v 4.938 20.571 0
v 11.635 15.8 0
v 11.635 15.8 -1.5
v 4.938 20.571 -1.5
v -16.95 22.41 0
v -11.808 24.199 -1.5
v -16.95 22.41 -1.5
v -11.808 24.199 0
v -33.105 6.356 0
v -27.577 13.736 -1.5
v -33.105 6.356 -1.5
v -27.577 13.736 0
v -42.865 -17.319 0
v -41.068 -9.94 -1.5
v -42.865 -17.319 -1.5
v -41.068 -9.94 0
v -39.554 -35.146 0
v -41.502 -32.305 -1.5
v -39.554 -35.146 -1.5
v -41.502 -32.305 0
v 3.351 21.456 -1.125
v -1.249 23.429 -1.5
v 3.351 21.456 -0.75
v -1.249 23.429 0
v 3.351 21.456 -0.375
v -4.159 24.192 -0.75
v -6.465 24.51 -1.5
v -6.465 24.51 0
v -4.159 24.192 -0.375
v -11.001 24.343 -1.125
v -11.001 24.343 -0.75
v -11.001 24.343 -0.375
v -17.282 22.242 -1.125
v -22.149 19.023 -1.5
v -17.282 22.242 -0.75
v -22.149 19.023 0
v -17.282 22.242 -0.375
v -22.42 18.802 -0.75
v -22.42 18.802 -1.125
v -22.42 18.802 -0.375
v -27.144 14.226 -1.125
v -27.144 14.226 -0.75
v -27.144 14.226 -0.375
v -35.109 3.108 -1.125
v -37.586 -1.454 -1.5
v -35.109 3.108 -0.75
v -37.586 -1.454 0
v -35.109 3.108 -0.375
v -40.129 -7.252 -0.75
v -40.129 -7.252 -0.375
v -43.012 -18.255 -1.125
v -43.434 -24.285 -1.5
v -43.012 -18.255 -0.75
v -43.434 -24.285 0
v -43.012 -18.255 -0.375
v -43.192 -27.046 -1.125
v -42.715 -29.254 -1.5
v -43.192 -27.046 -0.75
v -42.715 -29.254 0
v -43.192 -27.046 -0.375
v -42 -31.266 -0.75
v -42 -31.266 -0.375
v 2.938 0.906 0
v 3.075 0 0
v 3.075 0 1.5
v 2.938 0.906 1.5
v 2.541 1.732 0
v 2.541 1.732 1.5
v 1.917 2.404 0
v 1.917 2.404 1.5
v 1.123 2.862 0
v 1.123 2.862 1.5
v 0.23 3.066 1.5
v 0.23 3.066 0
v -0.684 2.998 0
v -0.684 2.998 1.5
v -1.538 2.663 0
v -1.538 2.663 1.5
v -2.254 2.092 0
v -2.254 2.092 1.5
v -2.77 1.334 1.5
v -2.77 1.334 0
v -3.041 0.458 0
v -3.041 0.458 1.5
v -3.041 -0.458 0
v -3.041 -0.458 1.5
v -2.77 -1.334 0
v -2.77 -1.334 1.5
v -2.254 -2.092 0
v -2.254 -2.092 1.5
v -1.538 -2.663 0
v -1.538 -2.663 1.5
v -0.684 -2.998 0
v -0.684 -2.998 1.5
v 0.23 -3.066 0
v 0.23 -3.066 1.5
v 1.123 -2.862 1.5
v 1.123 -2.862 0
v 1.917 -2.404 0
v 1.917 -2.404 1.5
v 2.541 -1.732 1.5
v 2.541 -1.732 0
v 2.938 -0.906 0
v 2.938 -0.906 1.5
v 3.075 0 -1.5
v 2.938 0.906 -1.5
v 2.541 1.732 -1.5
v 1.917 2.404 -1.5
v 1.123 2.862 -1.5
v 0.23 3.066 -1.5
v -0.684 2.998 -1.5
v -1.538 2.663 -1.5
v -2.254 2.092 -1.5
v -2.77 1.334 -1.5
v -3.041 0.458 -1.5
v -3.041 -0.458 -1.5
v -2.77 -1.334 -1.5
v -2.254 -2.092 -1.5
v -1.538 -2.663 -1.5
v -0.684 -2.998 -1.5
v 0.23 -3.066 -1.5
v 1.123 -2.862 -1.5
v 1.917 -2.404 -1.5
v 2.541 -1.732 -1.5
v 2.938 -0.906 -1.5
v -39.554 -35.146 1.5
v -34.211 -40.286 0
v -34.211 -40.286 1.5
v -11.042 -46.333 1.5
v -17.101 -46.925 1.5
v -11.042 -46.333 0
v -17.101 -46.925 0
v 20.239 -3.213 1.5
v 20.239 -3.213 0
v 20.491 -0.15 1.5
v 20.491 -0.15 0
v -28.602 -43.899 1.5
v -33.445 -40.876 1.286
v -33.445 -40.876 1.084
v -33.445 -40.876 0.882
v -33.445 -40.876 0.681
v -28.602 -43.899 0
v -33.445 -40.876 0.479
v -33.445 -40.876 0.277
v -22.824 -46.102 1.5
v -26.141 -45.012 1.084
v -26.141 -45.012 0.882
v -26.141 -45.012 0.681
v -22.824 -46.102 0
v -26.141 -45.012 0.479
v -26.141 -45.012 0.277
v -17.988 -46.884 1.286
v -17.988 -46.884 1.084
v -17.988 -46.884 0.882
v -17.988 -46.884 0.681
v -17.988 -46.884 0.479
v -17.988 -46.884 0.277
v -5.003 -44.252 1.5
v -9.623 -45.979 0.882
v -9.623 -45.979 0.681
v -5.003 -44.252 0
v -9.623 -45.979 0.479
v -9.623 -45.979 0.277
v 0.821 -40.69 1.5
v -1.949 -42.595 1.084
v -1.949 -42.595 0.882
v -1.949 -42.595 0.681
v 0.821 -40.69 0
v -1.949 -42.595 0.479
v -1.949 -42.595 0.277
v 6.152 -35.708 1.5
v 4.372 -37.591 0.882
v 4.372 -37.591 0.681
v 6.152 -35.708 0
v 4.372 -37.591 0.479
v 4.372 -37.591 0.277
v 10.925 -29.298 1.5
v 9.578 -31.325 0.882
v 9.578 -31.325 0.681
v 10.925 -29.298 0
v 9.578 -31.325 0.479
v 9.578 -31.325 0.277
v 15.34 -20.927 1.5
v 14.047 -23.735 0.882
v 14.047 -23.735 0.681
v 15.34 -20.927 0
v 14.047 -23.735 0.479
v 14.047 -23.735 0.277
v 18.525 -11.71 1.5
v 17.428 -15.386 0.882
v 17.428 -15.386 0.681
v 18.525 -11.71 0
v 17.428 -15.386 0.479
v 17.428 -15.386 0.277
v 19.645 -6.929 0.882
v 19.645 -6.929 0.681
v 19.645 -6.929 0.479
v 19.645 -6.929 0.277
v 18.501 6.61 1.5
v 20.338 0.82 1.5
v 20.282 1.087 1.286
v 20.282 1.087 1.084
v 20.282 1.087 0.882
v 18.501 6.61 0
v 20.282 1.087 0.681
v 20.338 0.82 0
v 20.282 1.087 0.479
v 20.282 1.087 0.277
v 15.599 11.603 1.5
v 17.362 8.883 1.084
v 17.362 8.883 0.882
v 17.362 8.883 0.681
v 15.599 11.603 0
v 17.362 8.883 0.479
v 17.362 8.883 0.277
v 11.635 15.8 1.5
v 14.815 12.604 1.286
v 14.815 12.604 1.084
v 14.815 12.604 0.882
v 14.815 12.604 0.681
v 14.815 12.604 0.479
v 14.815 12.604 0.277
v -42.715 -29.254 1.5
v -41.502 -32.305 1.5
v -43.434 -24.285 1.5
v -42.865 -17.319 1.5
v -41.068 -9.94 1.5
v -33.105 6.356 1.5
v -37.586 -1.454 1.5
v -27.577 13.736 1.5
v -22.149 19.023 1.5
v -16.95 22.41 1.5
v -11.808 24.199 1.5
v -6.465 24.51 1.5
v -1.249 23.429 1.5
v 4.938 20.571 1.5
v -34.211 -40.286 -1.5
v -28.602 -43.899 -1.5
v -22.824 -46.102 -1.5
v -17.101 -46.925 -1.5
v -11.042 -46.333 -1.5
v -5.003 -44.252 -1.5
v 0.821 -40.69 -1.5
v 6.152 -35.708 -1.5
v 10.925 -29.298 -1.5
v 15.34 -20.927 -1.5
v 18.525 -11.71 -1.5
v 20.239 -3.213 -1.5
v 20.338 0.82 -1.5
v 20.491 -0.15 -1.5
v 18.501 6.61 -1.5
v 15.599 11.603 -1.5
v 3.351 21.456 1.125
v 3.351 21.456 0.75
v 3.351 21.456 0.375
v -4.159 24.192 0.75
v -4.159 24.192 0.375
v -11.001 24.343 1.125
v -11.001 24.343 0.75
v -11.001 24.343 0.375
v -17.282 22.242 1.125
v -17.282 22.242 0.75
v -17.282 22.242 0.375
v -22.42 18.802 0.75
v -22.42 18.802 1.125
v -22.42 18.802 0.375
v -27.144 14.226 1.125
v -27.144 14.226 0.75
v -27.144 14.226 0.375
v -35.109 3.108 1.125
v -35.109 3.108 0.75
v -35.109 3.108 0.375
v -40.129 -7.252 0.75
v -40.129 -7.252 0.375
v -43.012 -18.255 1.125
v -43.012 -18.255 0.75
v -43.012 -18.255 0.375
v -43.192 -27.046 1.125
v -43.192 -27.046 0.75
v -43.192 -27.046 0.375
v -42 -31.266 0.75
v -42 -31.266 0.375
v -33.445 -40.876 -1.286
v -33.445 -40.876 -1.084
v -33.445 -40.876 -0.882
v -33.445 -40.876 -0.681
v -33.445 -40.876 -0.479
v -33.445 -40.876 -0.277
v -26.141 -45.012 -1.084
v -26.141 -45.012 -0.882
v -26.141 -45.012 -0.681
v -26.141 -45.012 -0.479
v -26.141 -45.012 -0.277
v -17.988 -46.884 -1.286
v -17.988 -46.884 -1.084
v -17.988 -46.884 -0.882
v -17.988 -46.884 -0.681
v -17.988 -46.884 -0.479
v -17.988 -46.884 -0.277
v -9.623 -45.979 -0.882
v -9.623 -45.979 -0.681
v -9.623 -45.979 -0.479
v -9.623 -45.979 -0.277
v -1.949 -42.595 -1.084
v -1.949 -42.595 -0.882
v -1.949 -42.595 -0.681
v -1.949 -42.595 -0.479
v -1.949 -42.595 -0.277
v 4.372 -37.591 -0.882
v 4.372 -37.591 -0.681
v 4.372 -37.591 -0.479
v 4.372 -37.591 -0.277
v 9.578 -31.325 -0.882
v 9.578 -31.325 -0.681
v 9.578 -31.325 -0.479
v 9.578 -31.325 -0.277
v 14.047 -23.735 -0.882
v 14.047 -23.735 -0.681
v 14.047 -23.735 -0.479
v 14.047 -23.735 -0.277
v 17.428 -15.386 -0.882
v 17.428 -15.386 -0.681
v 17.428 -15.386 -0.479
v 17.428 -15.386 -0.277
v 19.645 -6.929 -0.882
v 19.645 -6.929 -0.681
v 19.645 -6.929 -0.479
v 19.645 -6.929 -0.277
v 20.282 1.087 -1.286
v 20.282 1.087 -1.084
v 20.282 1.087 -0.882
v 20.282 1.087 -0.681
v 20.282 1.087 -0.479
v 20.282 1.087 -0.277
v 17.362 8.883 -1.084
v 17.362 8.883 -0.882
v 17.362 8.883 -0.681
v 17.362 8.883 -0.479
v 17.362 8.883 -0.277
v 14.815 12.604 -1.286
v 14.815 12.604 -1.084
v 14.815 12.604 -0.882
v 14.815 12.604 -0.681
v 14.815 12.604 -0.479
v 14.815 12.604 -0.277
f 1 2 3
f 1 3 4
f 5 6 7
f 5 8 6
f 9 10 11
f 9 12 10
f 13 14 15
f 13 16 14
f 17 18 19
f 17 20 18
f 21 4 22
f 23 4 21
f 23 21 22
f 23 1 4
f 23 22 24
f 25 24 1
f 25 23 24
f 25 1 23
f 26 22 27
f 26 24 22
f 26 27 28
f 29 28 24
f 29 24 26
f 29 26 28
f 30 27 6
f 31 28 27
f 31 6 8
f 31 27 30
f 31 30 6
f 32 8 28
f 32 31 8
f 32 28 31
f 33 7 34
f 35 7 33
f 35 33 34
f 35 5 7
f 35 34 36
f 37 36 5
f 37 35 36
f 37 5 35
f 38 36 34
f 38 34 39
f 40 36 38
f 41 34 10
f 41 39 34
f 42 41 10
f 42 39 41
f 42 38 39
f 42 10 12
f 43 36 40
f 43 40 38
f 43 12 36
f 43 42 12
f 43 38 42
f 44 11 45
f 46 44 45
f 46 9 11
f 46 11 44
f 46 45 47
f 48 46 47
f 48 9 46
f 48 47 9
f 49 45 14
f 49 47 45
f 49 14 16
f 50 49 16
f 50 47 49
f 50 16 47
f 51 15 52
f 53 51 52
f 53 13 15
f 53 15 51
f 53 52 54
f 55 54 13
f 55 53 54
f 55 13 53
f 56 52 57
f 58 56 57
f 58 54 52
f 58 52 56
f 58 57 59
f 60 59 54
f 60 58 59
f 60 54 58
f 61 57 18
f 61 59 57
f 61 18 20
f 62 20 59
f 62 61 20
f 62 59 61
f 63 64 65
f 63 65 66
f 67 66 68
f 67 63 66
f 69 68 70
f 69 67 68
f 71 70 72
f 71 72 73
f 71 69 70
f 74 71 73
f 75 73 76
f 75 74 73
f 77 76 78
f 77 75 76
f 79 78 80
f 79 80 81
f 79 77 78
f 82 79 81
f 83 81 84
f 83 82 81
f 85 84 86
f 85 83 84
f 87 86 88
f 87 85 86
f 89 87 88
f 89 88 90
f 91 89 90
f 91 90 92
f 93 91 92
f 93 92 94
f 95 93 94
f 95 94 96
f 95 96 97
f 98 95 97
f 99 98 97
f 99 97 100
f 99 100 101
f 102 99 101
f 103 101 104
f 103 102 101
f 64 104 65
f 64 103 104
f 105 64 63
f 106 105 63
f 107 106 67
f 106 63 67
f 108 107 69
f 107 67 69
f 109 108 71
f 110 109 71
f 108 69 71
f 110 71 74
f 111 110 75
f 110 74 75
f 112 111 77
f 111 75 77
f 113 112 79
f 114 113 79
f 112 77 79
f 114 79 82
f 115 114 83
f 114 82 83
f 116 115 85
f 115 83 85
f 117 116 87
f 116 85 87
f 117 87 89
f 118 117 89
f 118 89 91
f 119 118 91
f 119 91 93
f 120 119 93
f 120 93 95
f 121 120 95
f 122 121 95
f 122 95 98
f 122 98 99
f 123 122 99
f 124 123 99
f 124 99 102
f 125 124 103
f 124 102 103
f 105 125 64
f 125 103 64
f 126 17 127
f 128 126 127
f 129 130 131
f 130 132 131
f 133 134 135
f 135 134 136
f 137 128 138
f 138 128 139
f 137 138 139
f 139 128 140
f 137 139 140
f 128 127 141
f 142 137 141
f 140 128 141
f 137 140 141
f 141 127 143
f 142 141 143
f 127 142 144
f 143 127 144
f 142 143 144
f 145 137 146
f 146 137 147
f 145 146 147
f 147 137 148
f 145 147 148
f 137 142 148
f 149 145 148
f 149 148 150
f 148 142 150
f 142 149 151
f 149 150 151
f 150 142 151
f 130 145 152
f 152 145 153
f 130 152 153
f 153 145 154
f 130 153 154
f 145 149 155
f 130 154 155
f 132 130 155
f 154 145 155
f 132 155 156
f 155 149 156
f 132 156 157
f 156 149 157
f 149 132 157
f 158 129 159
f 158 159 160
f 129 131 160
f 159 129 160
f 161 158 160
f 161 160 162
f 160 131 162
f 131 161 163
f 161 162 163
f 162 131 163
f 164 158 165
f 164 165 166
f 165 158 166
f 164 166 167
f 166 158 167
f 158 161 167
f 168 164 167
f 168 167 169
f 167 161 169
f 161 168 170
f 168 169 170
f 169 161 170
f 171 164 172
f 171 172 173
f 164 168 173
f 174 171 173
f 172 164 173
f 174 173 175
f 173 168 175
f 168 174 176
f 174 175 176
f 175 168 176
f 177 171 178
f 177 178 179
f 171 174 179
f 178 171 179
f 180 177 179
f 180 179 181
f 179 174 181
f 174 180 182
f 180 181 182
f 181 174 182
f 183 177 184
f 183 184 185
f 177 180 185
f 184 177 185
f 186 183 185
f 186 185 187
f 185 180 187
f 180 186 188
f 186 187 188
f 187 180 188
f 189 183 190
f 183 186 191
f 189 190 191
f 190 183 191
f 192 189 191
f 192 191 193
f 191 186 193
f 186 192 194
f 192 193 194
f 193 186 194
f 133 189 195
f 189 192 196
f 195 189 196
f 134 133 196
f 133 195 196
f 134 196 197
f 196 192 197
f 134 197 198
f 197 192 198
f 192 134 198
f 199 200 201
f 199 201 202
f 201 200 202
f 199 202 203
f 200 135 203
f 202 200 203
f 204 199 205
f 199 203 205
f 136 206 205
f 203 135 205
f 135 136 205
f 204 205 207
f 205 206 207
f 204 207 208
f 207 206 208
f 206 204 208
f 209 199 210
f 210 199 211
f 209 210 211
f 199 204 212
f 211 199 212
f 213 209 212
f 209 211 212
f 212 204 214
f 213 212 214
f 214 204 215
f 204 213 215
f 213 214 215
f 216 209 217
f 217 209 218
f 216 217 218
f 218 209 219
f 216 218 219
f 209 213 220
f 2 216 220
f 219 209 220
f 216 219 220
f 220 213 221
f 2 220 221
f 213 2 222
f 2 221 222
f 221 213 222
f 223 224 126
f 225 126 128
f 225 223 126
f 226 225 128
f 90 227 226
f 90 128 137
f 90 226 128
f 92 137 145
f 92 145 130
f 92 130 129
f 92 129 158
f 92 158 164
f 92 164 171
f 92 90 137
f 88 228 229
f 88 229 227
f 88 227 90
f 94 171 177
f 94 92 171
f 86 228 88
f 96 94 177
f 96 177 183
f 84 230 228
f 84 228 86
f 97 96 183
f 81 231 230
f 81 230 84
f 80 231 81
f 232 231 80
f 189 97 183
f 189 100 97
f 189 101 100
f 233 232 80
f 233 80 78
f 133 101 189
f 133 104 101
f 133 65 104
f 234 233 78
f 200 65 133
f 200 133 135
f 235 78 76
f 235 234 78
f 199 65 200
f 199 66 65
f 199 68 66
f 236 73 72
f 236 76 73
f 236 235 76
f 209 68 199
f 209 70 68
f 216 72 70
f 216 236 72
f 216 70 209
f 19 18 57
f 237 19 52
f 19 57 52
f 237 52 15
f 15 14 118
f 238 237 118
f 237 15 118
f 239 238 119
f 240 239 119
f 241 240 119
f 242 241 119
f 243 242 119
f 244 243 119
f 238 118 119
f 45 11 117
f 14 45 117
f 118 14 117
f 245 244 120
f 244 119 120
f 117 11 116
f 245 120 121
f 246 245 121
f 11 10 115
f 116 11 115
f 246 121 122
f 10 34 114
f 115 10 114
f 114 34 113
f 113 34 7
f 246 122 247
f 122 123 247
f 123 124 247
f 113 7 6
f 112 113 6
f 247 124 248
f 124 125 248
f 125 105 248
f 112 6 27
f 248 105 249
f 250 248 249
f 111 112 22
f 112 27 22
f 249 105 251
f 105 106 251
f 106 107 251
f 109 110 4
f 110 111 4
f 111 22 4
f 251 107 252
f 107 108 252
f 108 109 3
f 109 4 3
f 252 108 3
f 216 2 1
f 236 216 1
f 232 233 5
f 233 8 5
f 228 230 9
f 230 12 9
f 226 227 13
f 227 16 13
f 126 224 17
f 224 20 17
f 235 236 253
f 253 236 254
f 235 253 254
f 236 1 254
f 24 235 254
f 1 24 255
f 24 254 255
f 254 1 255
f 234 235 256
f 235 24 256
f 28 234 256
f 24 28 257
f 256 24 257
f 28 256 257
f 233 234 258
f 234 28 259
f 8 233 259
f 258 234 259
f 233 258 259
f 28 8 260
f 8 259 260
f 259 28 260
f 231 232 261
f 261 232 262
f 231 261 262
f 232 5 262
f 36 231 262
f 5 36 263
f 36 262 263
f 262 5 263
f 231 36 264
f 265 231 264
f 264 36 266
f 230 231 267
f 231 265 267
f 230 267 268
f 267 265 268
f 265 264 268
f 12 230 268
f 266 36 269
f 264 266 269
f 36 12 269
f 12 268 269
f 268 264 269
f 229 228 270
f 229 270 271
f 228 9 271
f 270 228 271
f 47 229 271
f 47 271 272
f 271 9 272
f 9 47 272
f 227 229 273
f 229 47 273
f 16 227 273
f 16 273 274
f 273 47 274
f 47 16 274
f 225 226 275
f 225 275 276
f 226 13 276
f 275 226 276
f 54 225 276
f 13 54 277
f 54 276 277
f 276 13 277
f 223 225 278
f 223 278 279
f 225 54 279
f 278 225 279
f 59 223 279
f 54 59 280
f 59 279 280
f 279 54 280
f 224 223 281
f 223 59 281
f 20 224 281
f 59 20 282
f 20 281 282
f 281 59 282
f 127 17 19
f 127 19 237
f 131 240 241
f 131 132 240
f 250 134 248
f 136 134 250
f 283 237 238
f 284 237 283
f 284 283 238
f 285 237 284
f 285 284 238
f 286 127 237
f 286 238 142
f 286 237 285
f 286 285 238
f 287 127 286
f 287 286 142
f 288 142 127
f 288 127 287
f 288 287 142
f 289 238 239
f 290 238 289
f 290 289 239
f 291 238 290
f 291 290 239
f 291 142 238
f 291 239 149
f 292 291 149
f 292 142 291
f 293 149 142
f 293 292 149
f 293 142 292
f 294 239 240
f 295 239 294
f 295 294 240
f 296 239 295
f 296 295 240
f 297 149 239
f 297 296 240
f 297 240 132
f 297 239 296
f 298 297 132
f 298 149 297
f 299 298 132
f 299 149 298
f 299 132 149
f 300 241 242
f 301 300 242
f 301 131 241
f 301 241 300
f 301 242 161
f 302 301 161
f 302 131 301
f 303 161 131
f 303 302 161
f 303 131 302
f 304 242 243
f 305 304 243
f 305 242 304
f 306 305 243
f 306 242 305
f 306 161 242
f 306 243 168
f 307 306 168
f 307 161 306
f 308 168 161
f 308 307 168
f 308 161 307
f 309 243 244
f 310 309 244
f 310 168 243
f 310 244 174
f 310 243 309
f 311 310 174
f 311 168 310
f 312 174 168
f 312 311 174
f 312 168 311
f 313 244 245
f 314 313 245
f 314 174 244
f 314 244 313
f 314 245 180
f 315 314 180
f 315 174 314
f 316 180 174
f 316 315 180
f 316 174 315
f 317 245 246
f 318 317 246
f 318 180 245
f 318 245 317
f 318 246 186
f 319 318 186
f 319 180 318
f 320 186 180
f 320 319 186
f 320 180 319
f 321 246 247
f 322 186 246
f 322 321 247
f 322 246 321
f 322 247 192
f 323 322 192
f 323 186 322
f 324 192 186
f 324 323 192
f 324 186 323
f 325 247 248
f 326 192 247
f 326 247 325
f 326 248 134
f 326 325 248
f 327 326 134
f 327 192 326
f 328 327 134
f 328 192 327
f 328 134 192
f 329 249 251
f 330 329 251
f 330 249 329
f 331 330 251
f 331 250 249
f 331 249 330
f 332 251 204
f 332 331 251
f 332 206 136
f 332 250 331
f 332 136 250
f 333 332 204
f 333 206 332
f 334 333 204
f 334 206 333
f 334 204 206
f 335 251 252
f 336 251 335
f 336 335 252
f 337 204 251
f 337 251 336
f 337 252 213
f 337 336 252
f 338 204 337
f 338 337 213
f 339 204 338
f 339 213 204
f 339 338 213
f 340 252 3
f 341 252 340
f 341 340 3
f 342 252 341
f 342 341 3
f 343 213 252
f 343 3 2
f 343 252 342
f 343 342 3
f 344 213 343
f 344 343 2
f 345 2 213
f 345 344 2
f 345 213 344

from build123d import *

# Parameters (mm, degrees)
SKETCH1_R           = 3.075
BOSS_EXTRUDE1_DEPTH = 1.5


with BuildPart() as part:
    # Sketch1 → Boss-Extrude1 (new body, symmetric)
    with BuildSketch(Plane.XY):
        with BuildLine():
            add(Edge.make_bspline(
                [(11.634950811, 15.800321449), (0.028055904, 25.434294376), (-17.414020712, 27.248955021), (-35.895046658, 4.24235475), (-43.985427464, -15.828375506), (-43.784510858, -30.273405058), (-39.554444487, -35.146298118)],
                knots=[0, 0, 0, 0, 0.309251015, 0.582243378, 0.82001673, 1, 1, 1, 1], degree=3))
            add(Edge.make_bspline(
                [(-39.554444487, -35.146298118), (-39.358922613, -35.371532689), (-38.954086034, -35.828491757), (-38.327635377, -36.506087428), (-37.676443606, -37.179690264), (-37.009872208, -37.838353001), (-36.327930242, -38.48126825), (-35.63066602, -39.107612546), (-34.918167988, -39.716547883), (-34.190565543, -40.307223272), (-33.448029808, -40.878776337), (-32.69077435, -41.430334943), (-31.919055845, -41.961018846), (-31.133174691, -42.469941367), (-30.333475559, -42.956211101), (-29.520347896, -43.418933639), (-28.694226366, -43.857213315), (-27.855591239, -44.270154972), (-27.004968714, -44.656865748), (-26.142931193, -45.016456876), (-25.270097493, -45.348045498), (-24.387132993, -45.650756494), (-23.494749731, -45.923724325), (-22.593706438, -46.166094878), (-21.684808505, -46.377027339), (-20.768907906, -46.555695997), (-19.846903022, -46.701292365), (-18.919738523, -46.813026108), (-17.988404773, -46.890130465), (-17.053938685, -46.931850896), (-16.117432397, -46.937496322), (-15.180157109, -46.906262664), (-14.243541344, -46.838649178), (-13.309071096, -46.735482538), (-12.378226911, -46.597574573), (-11.452431472, -46.425809499), (-10.533049478, -46.221116988), (-9.621385604, -45.98447621), (-8.718683135, -45.716911513), (-7.826122528, -45.419490281), (-6.944820113, -45.093320168), (-6.075826863, -44.739546437), (-5.220127265, -44.359349237), (-4.378638282, -43.953940845), (-3.55220841, -43.524562882), (-2.741616825, -43.072483508), (-1.94757263, -42.59899458), (-1.170714201, -42.105408801), (-0.41160862, -41.593056844), (0.329248782, -41.063284469), (1.051434793, -40.517449617), (1.754598588, -39.956919504), (2.438461896, -39.383067709), (3.102819072, -38.797271252), (3.747537066, -38.200907678), (4.3725553, -37.595352143), (4.977885444, -36.981974506), (5.56361109, -36.362136423), (6.129887339, -35.737188467), (6.67694027, -35.10846724), (7.205066378, -34.477292547), (7.714631687, -33.844964441), (8.206071606, -33.212760844), (8.679887632, -32.581933137), (9.136655133, -31.953709323), (9.57699457, -31.329263633), (10.001748031, -30.709702111), (10.672895353, -29.703750915), (11.428525518, -28.508519974), (12.246317889, -27.124744933), (12.891237389, -25.973983265), (13.489692778, -24.84854664), (14.044959248, -23.748686352), (14.560186323, -22.674451737), (15.113664214, -21.460614522), (15.690659132, -20.114221695), (16.337692502, -18.490193148), (16.913259904, -16.921226819), (17.426730101, -15.404851168), (17.797865963, -14.233065689), (18.097016774, -13.23519842), (18.336075796, -12.402072423), (18.560568704, -11.584453827), (18.771491613, -10.781040119), (18.969668489, -9.990523568), (19.15575465, -9.211604238), (19.33024123, -8.443002714), (19.493460418, -7.683472363), (19.64559148, -6.93181113), (19.786667504, -6.186872813), (19.91658284, -5.447577787), (20.03510119, -4.712923134), (20.141864281, -3.981992149), (20.236400807, -3.253963203), (20.304581333, -2.648458676), (20.352371994, -2.165015202), (20.384674543, -1.803139053), (20.413598625, -1.441516308), (20.438222822, -1.080157274), (20.461501026, -0.718796446), (20.47192834, -0.358233383), (20.512193391, 0.007583611), (20.420294325, 0.366282304), (20.358204341, 0.727998489), (20.282605136, 1.086406254), (20.205316122, 1.442283779), (20.123259308, 1.795424153), (20.037316797, 2.14588286), (19.887962015, 2.722982176), (19.59669815, 3.742230413), (19.144722314, 5.067911953), (18.581419243, 6.456455163), (18.005560921, 7.69265439), (17.374399513, 8.885317521), (16.689168578, 10.033912511), (15.950881261, 11.137645383), (15.160392762, 12.195428176), (14.318466864, 13.205858223), (13.425843473, 14.16720628), (12.530077513, 15.032247758), (11.920778524, 15.563078287), (11.634950811, 15.800321449)],
                knots=[0.561512544, 0.561512544, 0.561512544, 0.561512544, 0.565782528, 0.570252105, 0.57472292, 0.579194639, 0.583666924, 0.588139439, 0.592611855, 0.597083853, 0.601555132, 0.606025412, 0.610494439, 0.614961992, 0.619427887, 0.623891985, 0.628354194, 0.632814475, 0.637272853, 0.641729416, 0.646184326, 0.650637823, 0.655090233, 0.659541971, 0.663993554, 0.668445597, 0.672898832, 0.677354104, 0.681812384, 0.68627477, 0.690742499, 0.695216754, 0.699697325, 0.704183213, 0.708673274, 0.713166232, 0.71766069, 0.722155137, 0.726647962, 0.731137456, 0.735621826, 0.7400992, 0.744567632, 0.749025113, 0.753469575, 0.757898896, 0.762310907, 0.766703399, 0.771074124, 0.775420805, 0.779741136, 0.784032793, 0.788293433, 0.792520702, 0.796712241, 0.800865688, 0.804978687, 0.809048891, 0.813073968, 0.817051612, 0.820979544, 0.824855525, 0.82867736, 0.832442913, 0.836150111, 0.839796963, 0.843381676, 0.84690413, 0.857109335, 0.863622561, 0.86991433, 0.875993807, 0.881870128, 0.887552392, 0.893049665, 0.900968457, 0.908521612, 0.918075538, 0.924891611, 0.931440483, 0.935671971, 0.939805498, 0.943849063, 0.947810449, 0.95169719, 0.955516554, 0.959275508, 0.962980703, 0.966638443, 0.970254675, 0.973834969, 0.977384508, 0.980908081, 0.984410078, 0.987894493, 0.989631248, 0.991364926, 0.993095918, 0.994824589, 0.996551283, 0.998276321, 1, 1.001764203, 1.003519492, 1.005266096, 1.007004244, 1.008734164, 1.010456082, 1.01217022, 1.017268173, 1.025629542, 1.032212071, 1.038713875, 1.045147285, 1.05152405, 1.057855307, 1.064151567, 1.070422701, 1.076677929, 1.082925818, 1.088243786, 1.088243786, 1.088243786, 1.088243786], degree=3))
        make_face()
        Circle(SKETCH1_R, mode=Mode.SUBTRACT)
    extrude(amount=BOSS_EXTRUDE1_DEPTH, both=True)


solid = part.part
